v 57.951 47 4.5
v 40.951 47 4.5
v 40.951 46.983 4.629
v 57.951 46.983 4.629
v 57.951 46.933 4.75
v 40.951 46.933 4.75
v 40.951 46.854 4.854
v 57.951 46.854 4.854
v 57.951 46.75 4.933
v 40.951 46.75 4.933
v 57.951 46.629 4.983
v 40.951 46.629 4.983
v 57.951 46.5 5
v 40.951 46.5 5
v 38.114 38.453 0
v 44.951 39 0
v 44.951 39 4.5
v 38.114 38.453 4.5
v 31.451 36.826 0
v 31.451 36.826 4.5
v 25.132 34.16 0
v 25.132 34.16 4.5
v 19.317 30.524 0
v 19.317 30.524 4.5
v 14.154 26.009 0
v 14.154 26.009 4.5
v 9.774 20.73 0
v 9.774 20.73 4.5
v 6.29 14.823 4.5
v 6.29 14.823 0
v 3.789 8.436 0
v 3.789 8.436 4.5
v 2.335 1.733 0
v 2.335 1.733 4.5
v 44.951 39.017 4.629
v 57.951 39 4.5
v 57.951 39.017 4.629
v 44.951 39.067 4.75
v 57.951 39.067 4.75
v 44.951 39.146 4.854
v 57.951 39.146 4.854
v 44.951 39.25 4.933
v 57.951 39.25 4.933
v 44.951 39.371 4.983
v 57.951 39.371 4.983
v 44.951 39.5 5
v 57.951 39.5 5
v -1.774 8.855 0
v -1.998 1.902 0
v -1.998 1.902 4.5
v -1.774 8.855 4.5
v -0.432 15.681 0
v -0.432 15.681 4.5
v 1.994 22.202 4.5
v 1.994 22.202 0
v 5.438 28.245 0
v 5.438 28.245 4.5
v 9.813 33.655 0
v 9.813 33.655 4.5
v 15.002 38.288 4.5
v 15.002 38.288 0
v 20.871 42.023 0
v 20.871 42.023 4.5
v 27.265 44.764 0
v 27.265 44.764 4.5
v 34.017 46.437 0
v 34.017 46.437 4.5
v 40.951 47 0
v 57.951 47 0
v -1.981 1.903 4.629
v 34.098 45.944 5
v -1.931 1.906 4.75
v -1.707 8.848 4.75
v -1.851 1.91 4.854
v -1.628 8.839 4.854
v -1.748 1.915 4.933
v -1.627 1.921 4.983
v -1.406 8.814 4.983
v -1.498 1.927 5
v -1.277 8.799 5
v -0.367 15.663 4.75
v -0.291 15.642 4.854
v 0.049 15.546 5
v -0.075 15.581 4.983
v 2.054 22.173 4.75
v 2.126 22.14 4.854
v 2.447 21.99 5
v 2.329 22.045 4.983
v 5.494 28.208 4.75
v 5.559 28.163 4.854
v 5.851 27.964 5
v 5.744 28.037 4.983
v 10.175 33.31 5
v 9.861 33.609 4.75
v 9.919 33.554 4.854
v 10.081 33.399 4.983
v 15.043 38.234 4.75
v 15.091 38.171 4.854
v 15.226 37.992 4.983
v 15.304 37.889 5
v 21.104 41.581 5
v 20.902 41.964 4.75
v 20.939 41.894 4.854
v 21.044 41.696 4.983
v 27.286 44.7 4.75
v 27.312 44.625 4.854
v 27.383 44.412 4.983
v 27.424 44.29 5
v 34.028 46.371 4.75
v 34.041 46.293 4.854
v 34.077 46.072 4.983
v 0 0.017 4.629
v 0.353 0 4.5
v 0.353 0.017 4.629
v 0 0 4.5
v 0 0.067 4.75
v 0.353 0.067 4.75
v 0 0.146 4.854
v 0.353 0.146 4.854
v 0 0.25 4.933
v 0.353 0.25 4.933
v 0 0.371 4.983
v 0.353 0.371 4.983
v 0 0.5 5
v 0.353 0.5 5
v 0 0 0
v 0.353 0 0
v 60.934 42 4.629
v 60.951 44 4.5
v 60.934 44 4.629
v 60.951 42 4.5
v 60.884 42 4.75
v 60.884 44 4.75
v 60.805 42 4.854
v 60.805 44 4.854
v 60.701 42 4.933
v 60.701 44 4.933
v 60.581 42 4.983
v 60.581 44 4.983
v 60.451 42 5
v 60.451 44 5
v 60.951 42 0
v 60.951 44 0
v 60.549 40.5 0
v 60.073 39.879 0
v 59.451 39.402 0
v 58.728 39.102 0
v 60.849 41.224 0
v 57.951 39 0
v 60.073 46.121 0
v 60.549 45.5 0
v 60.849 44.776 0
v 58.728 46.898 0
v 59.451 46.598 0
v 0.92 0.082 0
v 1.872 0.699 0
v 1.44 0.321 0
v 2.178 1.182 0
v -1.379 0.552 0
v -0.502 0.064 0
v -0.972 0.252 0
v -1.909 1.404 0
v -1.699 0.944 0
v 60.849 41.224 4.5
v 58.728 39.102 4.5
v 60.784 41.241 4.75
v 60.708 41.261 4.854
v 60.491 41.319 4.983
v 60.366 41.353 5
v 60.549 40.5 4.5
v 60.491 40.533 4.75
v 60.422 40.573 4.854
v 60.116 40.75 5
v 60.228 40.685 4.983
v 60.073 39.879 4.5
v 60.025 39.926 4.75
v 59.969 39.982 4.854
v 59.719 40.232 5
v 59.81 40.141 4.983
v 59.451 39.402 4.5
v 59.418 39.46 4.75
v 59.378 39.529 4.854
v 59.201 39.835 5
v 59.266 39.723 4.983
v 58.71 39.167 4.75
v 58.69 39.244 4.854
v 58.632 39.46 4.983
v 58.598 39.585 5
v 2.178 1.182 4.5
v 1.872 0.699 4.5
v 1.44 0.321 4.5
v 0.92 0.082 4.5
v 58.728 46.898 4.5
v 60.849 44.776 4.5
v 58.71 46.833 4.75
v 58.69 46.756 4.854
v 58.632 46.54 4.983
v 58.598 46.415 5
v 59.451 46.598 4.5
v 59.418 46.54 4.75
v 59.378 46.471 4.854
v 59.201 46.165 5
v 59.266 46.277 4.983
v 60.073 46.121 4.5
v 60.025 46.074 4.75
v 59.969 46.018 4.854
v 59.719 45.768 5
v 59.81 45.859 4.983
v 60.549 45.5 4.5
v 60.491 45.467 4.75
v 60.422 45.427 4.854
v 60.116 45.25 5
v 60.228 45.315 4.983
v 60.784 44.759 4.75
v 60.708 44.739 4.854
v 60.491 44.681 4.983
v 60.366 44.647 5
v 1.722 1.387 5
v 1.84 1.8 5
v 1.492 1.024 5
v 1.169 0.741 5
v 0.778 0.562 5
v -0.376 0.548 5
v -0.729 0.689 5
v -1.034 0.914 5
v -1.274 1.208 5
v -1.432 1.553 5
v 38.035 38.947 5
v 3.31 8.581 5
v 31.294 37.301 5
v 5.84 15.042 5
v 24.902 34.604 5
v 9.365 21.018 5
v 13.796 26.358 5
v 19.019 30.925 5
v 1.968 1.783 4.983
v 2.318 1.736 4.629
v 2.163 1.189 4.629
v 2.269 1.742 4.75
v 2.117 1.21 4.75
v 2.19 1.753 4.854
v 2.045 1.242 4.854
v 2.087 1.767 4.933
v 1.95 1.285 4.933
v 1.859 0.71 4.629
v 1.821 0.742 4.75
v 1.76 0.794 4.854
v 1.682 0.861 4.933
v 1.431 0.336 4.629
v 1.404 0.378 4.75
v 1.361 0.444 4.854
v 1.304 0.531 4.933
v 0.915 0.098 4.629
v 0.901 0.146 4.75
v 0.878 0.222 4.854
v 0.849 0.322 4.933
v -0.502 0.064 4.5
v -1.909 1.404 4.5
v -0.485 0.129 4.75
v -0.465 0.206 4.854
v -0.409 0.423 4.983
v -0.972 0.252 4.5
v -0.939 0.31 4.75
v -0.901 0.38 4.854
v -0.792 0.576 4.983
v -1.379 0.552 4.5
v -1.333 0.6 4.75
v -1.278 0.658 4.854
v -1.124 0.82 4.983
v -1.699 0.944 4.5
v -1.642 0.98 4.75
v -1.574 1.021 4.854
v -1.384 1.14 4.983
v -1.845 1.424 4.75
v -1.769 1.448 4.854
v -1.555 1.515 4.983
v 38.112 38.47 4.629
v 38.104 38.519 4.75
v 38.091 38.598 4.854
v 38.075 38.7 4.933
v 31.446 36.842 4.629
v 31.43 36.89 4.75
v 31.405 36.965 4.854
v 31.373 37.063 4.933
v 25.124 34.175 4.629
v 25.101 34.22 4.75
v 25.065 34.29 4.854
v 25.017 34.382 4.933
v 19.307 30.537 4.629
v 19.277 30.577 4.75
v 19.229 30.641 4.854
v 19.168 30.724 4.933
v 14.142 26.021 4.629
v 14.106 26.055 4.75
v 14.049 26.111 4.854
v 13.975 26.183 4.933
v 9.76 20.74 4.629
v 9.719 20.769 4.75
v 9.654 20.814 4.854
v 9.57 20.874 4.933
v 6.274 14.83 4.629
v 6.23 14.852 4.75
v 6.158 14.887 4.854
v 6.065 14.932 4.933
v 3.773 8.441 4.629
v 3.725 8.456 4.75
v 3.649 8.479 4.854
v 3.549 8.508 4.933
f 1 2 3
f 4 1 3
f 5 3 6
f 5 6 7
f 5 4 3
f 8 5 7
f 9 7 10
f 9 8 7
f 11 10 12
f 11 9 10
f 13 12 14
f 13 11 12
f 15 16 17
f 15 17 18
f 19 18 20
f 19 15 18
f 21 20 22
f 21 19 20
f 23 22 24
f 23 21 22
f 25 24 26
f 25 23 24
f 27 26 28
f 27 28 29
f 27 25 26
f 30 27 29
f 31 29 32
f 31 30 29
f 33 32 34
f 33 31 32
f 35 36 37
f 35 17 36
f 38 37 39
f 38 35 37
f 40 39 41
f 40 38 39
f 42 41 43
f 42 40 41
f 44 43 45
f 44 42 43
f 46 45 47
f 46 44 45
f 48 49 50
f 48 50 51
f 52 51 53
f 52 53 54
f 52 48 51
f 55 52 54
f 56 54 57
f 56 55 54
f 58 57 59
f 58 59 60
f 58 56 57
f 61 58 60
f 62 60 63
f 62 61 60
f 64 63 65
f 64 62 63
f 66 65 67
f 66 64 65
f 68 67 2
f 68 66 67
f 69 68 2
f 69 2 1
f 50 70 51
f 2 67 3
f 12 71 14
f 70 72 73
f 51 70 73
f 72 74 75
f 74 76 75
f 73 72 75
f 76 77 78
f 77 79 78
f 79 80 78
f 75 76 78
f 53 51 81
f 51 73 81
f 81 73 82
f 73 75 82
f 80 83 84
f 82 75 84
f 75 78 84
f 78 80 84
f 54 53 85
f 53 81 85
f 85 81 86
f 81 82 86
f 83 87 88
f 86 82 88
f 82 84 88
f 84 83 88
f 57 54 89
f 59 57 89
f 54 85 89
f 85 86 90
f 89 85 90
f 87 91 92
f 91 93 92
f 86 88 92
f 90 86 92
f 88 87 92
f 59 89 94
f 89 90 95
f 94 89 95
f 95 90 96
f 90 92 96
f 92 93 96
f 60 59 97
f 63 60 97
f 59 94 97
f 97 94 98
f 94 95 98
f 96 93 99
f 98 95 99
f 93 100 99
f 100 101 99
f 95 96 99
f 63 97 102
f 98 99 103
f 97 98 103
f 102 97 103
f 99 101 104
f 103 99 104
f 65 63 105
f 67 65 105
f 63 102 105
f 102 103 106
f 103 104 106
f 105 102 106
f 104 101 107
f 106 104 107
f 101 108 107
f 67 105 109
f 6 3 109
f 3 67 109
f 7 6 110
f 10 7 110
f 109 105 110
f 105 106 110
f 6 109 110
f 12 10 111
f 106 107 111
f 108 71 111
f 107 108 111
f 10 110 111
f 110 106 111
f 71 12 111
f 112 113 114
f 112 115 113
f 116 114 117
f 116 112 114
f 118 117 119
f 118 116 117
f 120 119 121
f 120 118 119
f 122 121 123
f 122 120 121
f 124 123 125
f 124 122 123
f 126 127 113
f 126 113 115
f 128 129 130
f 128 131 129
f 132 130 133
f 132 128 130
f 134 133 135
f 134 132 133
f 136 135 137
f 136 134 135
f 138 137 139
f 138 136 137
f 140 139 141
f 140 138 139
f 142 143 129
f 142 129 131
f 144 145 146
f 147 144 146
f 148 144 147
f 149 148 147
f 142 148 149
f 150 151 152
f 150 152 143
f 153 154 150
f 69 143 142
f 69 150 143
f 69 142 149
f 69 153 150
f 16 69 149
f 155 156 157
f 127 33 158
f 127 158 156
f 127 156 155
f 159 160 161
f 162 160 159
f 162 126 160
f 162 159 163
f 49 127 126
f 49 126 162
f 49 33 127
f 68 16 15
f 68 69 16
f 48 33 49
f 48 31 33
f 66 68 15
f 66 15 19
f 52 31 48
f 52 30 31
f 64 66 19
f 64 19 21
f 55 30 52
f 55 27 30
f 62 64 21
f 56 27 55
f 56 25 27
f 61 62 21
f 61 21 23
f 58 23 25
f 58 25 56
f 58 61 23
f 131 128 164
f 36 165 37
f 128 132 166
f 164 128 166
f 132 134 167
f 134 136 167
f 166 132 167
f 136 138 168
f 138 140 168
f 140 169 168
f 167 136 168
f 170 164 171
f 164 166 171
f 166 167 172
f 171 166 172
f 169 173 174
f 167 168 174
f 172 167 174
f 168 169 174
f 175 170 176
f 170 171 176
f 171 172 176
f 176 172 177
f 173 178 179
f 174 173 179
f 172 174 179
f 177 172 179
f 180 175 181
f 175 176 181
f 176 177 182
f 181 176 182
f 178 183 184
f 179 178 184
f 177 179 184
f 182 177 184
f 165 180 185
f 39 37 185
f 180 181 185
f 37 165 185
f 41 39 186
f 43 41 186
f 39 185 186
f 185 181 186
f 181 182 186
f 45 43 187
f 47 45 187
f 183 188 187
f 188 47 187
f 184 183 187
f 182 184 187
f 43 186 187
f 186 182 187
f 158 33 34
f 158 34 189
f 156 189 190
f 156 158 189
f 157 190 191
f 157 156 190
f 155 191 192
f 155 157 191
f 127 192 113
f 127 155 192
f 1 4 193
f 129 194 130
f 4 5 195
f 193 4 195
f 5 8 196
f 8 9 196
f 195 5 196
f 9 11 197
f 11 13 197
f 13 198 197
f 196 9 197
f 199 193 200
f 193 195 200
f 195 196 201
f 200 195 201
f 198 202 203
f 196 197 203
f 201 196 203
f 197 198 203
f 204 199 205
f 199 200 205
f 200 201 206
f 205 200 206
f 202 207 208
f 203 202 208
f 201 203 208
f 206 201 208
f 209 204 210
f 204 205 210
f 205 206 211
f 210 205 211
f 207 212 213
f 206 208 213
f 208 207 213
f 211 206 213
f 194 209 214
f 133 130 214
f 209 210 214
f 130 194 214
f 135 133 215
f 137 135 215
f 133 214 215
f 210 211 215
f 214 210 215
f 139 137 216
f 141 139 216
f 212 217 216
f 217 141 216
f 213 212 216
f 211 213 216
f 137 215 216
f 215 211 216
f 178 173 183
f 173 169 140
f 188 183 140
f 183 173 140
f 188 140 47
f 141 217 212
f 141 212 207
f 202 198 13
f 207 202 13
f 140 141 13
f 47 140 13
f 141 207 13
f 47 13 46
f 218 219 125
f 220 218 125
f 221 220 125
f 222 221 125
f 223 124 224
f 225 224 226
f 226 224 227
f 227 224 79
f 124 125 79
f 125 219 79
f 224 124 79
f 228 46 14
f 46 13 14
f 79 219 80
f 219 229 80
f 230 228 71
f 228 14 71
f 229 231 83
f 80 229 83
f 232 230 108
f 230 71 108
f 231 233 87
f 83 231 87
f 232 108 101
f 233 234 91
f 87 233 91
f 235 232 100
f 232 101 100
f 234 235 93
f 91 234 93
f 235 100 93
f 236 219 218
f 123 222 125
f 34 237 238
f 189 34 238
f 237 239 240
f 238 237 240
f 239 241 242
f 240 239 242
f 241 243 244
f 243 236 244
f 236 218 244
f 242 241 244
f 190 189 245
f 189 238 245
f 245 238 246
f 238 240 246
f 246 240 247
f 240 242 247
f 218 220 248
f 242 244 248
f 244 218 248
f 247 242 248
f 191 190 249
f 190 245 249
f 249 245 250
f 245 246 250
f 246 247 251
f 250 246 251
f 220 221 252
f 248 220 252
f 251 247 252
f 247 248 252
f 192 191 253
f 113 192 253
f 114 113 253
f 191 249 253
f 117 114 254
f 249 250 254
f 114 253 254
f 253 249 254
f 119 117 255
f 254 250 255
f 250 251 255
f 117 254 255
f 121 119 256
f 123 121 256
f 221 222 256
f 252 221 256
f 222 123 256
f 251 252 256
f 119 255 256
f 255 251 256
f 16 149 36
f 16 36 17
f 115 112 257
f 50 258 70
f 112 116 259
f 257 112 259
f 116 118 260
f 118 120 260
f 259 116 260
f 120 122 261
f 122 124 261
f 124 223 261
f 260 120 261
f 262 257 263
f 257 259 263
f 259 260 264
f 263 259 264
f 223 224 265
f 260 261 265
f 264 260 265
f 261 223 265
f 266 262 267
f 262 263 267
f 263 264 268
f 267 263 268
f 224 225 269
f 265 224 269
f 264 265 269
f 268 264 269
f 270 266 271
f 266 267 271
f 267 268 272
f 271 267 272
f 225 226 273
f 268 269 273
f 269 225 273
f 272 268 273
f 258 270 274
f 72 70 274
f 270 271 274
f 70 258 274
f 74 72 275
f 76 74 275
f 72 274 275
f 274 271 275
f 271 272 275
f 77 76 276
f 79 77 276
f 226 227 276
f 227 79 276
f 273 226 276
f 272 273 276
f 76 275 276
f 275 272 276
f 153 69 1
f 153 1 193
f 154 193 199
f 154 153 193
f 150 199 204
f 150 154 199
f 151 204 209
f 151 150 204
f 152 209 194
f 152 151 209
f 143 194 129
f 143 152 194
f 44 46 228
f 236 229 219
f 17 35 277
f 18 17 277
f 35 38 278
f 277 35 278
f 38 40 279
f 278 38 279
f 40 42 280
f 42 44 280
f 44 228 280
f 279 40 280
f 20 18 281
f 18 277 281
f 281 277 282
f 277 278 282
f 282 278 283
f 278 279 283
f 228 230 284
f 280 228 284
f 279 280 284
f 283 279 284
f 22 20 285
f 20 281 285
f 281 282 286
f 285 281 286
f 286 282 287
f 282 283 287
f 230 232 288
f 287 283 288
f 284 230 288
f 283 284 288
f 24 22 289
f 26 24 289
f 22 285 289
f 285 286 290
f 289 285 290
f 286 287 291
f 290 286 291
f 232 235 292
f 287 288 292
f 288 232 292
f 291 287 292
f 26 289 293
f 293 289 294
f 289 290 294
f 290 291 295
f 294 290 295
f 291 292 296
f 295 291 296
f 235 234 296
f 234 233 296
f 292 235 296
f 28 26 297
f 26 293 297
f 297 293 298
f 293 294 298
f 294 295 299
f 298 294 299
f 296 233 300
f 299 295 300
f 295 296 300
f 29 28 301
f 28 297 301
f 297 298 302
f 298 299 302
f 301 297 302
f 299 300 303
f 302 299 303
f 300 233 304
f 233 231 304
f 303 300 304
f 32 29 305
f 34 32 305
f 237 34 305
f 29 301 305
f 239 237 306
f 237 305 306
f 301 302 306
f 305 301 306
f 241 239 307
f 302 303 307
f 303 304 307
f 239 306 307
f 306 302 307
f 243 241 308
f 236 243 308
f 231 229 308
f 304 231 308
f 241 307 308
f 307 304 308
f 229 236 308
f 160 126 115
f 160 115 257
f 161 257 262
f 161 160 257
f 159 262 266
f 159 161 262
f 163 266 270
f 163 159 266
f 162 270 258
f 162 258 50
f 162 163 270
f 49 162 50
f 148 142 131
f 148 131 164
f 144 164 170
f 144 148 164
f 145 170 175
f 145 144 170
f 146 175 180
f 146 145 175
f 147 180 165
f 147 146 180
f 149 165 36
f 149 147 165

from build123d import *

# Parameters (mm, degrees)
EXTRUDE_1_DEPTH = 5
FILLET_1_R      = 0.5


with BuildPart() as part:
    # Эскиз1 → Бобышка-Вытянуть1 (new body)
    with BuildSketch(Plane.XY):
        with BuildLine():
            Line((0.352984217, 0), (0, 0))
            ThreePointArc((0, 0), (-1.379289319, 0.551704113), (-1.997619047, 1.902439024))
            ThreePointArc((-1.997619047, 1.902439024), (9.812828894, 33.65472035), (40.951190459, 47))
            Line((40.951190459, 47), (57.951190459, 47))
            ThreePointArc((57.951190459, 47), (60.072510802, 46.121320344), (60.951190459, 44))
            Line((60.951190459, 44), (60.951190459, 42))
            ThreePointArc((60.951190459, 42), (60.072510802, 39.878679656), (57.951190459, 39))
            Line((57.951190459, 39), (44.951190459, 39))
            ThreePointArc((44.951190459, 39), (16.645125149, 28.369224066), (2.335126717, 1.733333333))
            ThreePointArc((2.335126717, 1.733333333), (1.669545394, 0.494454695), (0.352984217, 0))
        make_face()
    extrude(amount=EXTRUDE_1_DEPTH)

    # Скругление1
    fillet_1_edges = [part.edges().sort_by_distance(p)[0] for p in [
        (51.451190459, 39, 5),
        (60.072510802, 39.878679656, 5),
        (60.951190459, 43, 5),
        (60.072510802, 46.121320344, 5),
        (49.451190459, 47, 5),
        (9.812828894, 33.65472035, 5),
        (-1.379289319, 0.551704113, 5),
        (0.176492108, 0, 5),
        (1.669545394, 0.494454695, 5),
        (16.645125149, 28.369224066, 5),
    ]]
    fillet(fillet_1_edges, radius=FILLET_1_R)


solid = part.part
